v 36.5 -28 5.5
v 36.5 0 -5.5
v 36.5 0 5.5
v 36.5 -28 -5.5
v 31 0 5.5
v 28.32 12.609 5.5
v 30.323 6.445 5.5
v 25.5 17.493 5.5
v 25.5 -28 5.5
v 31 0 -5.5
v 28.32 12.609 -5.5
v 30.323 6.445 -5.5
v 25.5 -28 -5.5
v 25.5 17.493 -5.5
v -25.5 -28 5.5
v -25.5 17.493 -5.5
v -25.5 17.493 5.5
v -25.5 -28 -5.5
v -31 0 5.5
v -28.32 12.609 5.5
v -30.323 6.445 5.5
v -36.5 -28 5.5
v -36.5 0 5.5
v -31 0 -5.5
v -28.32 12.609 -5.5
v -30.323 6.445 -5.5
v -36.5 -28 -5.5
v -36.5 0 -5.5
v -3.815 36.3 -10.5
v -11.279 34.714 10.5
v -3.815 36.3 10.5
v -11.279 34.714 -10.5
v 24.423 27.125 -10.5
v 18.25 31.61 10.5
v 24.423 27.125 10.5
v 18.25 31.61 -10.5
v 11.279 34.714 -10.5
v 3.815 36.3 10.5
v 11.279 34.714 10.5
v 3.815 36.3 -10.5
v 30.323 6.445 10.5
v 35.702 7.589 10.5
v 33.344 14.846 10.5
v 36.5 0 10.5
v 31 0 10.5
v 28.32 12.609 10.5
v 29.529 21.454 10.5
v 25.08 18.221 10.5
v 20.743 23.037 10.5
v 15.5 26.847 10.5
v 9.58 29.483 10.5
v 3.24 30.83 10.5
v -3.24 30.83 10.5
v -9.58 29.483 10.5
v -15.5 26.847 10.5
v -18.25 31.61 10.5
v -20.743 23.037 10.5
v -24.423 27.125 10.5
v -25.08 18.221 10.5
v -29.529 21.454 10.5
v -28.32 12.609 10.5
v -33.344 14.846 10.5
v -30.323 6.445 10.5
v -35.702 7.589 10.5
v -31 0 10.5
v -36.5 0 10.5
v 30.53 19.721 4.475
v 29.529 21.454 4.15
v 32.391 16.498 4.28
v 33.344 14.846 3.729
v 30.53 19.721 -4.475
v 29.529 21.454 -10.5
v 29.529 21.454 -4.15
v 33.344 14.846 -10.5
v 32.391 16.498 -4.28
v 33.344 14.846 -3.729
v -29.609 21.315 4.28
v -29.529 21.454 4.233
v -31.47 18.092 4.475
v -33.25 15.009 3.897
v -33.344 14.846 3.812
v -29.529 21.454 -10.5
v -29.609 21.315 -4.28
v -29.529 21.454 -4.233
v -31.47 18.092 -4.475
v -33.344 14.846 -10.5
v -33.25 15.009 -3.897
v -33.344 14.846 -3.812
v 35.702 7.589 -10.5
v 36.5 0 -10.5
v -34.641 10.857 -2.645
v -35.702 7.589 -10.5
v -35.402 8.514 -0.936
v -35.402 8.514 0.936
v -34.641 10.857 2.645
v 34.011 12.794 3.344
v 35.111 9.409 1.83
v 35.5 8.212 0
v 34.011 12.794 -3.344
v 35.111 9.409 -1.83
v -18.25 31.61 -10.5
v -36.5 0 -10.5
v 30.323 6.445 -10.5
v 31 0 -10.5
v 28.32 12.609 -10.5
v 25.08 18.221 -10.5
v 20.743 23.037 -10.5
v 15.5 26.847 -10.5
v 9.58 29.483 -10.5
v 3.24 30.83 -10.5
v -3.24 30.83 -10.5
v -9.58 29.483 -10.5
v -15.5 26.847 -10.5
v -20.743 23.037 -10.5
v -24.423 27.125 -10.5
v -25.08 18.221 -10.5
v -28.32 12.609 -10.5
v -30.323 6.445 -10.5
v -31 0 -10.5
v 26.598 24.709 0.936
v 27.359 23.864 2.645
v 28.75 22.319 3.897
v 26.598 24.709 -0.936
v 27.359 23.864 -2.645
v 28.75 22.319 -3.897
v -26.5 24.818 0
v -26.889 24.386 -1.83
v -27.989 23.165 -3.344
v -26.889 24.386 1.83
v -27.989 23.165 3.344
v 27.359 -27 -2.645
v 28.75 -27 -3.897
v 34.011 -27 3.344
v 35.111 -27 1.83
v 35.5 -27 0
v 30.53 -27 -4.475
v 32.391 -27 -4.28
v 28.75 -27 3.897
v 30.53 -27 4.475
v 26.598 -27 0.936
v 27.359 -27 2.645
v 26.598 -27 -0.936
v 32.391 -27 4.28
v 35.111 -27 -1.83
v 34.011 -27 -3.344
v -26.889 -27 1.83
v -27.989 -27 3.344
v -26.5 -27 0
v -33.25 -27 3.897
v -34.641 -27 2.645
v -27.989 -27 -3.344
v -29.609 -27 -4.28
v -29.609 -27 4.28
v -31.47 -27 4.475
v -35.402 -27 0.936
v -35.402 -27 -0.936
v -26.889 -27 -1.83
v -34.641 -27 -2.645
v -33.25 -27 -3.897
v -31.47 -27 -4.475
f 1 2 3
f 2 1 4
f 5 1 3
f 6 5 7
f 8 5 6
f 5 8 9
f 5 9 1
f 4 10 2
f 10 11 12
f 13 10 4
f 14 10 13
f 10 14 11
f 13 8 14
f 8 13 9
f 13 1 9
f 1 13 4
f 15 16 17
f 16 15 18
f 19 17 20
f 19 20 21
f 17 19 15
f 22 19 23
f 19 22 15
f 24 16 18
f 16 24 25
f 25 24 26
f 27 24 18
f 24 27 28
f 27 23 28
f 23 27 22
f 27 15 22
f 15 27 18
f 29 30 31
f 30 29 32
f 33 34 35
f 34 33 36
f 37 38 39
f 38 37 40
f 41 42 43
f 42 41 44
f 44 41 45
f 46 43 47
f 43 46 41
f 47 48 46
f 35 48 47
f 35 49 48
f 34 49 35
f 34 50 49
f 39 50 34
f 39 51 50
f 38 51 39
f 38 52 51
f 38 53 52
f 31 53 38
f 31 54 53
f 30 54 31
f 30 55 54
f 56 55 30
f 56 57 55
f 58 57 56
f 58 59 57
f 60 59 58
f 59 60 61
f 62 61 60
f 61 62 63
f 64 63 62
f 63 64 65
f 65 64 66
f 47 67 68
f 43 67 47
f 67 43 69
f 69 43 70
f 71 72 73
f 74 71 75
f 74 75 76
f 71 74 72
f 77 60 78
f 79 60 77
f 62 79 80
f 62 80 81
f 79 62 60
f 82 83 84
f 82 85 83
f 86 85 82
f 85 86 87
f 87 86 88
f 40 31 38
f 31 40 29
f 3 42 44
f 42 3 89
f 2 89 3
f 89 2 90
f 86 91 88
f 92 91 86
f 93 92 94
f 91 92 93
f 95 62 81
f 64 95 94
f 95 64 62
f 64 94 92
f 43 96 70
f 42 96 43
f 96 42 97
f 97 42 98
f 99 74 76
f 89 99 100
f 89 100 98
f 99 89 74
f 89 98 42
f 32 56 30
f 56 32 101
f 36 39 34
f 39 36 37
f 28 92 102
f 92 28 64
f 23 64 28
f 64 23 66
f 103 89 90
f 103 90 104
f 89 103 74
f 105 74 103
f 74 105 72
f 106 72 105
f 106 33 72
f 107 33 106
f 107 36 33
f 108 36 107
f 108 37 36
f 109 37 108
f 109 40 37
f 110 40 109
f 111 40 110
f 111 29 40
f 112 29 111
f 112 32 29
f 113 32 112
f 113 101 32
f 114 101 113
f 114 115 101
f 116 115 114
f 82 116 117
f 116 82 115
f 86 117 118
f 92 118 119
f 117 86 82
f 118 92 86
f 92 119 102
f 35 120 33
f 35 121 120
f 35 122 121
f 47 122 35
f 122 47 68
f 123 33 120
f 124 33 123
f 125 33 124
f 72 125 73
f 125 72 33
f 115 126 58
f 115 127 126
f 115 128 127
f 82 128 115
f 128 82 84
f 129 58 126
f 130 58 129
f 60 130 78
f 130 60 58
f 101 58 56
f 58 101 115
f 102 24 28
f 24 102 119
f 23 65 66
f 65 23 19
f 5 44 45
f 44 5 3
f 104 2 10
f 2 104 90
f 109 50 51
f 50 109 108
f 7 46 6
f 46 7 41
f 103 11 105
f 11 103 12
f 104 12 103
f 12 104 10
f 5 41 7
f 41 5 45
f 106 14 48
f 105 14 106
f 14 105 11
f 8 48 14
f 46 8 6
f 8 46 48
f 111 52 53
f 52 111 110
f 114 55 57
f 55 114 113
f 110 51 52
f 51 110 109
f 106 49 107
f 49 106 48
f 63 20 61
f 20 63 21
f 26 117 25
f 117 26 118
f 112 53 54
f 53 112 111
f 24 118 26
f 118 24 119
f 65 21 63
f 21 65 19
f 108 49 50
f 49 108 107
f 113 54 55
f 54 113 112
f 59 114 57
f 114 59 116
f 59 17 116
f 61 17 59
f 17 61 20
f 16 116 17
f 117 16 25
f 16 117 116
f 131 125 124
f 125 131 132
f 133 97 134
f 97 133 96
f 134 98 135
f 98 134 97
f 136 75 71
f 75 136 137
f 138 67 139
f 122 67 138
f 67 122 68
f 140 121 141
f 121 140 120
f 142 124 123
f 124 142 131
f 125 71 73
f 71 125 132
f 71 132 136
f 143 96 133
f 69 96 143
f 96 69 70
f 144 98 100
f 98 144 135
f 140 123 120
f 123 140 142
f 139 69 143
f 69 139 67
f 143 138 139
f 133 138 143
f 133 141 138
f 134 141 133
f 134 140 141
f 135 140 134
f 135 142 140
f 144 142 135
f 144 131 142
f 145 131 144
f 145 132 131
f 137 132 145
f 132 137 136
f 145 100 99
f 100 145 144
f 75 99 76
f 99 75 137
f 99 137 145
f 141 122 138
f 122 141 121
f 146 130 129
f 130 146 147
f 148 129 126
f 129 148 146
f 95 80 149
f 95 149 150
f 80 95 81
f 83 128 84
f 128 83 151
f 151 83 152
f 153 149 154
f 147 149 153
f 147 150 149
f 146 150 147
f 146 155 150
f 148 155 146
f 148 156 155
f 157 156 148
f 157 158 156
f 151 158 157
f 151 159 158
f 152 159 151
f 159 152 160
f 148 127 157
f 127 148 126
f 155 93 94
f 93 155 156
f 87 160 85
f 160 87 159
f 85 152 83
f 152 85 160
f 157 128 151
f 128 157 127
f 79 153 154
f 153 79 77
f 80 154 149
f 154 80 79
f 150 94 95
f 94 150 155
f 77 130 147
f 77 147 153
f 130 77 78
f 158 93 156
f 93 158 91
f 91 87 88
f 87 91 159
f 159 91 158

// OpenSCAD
thickness = 5;
bar_diameter = 9;
distance_between_bars = 53;
inside_ring_diameter = 62;
bar_length = 27 * 2; // mirrored
arm_length = bar_length + 2;
arm_offset = distance_between_bars/2 + bar_diameter/2;
arm_side = bar_diameter + 2;
outside_ring_diameter = 2*arm_offset + arm_side;
ring_height = arm_side + 2*thickness;
e = 0.01;

module bar() {
  rotate([90, 0, 0]) cylinder(h = bar_length, d = bar_diameter, center=true);
}

module bars() {
  translate([arm_offset, 0, 0])  bar();
  translate([-arm_offset, 0, 0]) bar();
}

module arm() {
  cube([arm_side, arm_length, arm_side], center=true);
}

module arms() {
  translate([arm_offset, 0, 0])  arm();
  translate([-arm_offset, 0, 0]) arm();
}

module ring_chopper() {
  translate([0, -(inside_ring_diameter/2 + thickness), 0])
    cube([outside_ring_diameter + e, inside_ring_diameter + 2*thickness, ring_height + e], center=true);
}

module ring_hole() {
  cylinder(h = ring_height + e, d=inside_ring_diameter, center=true);
}

module ring() {
  difference() {
    cylinder(h = ring_height, d = outside_ring_diameter, center = true);
    ring_chopper(); 
    ring_hole();
  }
}

module outer_contour() {
  difference() {
    cube([outside_ring_diameter + e, outside_ring_diameter, ring_height + e], center = true);
    cylinder(h = ring_height + 2*e, d = outside_ring_diameter, center = true);
    ring_chopper();
  }
}

difference() {
  union() {
    arms();
    ring();
  }
  bars();
  outer_contour();
}
